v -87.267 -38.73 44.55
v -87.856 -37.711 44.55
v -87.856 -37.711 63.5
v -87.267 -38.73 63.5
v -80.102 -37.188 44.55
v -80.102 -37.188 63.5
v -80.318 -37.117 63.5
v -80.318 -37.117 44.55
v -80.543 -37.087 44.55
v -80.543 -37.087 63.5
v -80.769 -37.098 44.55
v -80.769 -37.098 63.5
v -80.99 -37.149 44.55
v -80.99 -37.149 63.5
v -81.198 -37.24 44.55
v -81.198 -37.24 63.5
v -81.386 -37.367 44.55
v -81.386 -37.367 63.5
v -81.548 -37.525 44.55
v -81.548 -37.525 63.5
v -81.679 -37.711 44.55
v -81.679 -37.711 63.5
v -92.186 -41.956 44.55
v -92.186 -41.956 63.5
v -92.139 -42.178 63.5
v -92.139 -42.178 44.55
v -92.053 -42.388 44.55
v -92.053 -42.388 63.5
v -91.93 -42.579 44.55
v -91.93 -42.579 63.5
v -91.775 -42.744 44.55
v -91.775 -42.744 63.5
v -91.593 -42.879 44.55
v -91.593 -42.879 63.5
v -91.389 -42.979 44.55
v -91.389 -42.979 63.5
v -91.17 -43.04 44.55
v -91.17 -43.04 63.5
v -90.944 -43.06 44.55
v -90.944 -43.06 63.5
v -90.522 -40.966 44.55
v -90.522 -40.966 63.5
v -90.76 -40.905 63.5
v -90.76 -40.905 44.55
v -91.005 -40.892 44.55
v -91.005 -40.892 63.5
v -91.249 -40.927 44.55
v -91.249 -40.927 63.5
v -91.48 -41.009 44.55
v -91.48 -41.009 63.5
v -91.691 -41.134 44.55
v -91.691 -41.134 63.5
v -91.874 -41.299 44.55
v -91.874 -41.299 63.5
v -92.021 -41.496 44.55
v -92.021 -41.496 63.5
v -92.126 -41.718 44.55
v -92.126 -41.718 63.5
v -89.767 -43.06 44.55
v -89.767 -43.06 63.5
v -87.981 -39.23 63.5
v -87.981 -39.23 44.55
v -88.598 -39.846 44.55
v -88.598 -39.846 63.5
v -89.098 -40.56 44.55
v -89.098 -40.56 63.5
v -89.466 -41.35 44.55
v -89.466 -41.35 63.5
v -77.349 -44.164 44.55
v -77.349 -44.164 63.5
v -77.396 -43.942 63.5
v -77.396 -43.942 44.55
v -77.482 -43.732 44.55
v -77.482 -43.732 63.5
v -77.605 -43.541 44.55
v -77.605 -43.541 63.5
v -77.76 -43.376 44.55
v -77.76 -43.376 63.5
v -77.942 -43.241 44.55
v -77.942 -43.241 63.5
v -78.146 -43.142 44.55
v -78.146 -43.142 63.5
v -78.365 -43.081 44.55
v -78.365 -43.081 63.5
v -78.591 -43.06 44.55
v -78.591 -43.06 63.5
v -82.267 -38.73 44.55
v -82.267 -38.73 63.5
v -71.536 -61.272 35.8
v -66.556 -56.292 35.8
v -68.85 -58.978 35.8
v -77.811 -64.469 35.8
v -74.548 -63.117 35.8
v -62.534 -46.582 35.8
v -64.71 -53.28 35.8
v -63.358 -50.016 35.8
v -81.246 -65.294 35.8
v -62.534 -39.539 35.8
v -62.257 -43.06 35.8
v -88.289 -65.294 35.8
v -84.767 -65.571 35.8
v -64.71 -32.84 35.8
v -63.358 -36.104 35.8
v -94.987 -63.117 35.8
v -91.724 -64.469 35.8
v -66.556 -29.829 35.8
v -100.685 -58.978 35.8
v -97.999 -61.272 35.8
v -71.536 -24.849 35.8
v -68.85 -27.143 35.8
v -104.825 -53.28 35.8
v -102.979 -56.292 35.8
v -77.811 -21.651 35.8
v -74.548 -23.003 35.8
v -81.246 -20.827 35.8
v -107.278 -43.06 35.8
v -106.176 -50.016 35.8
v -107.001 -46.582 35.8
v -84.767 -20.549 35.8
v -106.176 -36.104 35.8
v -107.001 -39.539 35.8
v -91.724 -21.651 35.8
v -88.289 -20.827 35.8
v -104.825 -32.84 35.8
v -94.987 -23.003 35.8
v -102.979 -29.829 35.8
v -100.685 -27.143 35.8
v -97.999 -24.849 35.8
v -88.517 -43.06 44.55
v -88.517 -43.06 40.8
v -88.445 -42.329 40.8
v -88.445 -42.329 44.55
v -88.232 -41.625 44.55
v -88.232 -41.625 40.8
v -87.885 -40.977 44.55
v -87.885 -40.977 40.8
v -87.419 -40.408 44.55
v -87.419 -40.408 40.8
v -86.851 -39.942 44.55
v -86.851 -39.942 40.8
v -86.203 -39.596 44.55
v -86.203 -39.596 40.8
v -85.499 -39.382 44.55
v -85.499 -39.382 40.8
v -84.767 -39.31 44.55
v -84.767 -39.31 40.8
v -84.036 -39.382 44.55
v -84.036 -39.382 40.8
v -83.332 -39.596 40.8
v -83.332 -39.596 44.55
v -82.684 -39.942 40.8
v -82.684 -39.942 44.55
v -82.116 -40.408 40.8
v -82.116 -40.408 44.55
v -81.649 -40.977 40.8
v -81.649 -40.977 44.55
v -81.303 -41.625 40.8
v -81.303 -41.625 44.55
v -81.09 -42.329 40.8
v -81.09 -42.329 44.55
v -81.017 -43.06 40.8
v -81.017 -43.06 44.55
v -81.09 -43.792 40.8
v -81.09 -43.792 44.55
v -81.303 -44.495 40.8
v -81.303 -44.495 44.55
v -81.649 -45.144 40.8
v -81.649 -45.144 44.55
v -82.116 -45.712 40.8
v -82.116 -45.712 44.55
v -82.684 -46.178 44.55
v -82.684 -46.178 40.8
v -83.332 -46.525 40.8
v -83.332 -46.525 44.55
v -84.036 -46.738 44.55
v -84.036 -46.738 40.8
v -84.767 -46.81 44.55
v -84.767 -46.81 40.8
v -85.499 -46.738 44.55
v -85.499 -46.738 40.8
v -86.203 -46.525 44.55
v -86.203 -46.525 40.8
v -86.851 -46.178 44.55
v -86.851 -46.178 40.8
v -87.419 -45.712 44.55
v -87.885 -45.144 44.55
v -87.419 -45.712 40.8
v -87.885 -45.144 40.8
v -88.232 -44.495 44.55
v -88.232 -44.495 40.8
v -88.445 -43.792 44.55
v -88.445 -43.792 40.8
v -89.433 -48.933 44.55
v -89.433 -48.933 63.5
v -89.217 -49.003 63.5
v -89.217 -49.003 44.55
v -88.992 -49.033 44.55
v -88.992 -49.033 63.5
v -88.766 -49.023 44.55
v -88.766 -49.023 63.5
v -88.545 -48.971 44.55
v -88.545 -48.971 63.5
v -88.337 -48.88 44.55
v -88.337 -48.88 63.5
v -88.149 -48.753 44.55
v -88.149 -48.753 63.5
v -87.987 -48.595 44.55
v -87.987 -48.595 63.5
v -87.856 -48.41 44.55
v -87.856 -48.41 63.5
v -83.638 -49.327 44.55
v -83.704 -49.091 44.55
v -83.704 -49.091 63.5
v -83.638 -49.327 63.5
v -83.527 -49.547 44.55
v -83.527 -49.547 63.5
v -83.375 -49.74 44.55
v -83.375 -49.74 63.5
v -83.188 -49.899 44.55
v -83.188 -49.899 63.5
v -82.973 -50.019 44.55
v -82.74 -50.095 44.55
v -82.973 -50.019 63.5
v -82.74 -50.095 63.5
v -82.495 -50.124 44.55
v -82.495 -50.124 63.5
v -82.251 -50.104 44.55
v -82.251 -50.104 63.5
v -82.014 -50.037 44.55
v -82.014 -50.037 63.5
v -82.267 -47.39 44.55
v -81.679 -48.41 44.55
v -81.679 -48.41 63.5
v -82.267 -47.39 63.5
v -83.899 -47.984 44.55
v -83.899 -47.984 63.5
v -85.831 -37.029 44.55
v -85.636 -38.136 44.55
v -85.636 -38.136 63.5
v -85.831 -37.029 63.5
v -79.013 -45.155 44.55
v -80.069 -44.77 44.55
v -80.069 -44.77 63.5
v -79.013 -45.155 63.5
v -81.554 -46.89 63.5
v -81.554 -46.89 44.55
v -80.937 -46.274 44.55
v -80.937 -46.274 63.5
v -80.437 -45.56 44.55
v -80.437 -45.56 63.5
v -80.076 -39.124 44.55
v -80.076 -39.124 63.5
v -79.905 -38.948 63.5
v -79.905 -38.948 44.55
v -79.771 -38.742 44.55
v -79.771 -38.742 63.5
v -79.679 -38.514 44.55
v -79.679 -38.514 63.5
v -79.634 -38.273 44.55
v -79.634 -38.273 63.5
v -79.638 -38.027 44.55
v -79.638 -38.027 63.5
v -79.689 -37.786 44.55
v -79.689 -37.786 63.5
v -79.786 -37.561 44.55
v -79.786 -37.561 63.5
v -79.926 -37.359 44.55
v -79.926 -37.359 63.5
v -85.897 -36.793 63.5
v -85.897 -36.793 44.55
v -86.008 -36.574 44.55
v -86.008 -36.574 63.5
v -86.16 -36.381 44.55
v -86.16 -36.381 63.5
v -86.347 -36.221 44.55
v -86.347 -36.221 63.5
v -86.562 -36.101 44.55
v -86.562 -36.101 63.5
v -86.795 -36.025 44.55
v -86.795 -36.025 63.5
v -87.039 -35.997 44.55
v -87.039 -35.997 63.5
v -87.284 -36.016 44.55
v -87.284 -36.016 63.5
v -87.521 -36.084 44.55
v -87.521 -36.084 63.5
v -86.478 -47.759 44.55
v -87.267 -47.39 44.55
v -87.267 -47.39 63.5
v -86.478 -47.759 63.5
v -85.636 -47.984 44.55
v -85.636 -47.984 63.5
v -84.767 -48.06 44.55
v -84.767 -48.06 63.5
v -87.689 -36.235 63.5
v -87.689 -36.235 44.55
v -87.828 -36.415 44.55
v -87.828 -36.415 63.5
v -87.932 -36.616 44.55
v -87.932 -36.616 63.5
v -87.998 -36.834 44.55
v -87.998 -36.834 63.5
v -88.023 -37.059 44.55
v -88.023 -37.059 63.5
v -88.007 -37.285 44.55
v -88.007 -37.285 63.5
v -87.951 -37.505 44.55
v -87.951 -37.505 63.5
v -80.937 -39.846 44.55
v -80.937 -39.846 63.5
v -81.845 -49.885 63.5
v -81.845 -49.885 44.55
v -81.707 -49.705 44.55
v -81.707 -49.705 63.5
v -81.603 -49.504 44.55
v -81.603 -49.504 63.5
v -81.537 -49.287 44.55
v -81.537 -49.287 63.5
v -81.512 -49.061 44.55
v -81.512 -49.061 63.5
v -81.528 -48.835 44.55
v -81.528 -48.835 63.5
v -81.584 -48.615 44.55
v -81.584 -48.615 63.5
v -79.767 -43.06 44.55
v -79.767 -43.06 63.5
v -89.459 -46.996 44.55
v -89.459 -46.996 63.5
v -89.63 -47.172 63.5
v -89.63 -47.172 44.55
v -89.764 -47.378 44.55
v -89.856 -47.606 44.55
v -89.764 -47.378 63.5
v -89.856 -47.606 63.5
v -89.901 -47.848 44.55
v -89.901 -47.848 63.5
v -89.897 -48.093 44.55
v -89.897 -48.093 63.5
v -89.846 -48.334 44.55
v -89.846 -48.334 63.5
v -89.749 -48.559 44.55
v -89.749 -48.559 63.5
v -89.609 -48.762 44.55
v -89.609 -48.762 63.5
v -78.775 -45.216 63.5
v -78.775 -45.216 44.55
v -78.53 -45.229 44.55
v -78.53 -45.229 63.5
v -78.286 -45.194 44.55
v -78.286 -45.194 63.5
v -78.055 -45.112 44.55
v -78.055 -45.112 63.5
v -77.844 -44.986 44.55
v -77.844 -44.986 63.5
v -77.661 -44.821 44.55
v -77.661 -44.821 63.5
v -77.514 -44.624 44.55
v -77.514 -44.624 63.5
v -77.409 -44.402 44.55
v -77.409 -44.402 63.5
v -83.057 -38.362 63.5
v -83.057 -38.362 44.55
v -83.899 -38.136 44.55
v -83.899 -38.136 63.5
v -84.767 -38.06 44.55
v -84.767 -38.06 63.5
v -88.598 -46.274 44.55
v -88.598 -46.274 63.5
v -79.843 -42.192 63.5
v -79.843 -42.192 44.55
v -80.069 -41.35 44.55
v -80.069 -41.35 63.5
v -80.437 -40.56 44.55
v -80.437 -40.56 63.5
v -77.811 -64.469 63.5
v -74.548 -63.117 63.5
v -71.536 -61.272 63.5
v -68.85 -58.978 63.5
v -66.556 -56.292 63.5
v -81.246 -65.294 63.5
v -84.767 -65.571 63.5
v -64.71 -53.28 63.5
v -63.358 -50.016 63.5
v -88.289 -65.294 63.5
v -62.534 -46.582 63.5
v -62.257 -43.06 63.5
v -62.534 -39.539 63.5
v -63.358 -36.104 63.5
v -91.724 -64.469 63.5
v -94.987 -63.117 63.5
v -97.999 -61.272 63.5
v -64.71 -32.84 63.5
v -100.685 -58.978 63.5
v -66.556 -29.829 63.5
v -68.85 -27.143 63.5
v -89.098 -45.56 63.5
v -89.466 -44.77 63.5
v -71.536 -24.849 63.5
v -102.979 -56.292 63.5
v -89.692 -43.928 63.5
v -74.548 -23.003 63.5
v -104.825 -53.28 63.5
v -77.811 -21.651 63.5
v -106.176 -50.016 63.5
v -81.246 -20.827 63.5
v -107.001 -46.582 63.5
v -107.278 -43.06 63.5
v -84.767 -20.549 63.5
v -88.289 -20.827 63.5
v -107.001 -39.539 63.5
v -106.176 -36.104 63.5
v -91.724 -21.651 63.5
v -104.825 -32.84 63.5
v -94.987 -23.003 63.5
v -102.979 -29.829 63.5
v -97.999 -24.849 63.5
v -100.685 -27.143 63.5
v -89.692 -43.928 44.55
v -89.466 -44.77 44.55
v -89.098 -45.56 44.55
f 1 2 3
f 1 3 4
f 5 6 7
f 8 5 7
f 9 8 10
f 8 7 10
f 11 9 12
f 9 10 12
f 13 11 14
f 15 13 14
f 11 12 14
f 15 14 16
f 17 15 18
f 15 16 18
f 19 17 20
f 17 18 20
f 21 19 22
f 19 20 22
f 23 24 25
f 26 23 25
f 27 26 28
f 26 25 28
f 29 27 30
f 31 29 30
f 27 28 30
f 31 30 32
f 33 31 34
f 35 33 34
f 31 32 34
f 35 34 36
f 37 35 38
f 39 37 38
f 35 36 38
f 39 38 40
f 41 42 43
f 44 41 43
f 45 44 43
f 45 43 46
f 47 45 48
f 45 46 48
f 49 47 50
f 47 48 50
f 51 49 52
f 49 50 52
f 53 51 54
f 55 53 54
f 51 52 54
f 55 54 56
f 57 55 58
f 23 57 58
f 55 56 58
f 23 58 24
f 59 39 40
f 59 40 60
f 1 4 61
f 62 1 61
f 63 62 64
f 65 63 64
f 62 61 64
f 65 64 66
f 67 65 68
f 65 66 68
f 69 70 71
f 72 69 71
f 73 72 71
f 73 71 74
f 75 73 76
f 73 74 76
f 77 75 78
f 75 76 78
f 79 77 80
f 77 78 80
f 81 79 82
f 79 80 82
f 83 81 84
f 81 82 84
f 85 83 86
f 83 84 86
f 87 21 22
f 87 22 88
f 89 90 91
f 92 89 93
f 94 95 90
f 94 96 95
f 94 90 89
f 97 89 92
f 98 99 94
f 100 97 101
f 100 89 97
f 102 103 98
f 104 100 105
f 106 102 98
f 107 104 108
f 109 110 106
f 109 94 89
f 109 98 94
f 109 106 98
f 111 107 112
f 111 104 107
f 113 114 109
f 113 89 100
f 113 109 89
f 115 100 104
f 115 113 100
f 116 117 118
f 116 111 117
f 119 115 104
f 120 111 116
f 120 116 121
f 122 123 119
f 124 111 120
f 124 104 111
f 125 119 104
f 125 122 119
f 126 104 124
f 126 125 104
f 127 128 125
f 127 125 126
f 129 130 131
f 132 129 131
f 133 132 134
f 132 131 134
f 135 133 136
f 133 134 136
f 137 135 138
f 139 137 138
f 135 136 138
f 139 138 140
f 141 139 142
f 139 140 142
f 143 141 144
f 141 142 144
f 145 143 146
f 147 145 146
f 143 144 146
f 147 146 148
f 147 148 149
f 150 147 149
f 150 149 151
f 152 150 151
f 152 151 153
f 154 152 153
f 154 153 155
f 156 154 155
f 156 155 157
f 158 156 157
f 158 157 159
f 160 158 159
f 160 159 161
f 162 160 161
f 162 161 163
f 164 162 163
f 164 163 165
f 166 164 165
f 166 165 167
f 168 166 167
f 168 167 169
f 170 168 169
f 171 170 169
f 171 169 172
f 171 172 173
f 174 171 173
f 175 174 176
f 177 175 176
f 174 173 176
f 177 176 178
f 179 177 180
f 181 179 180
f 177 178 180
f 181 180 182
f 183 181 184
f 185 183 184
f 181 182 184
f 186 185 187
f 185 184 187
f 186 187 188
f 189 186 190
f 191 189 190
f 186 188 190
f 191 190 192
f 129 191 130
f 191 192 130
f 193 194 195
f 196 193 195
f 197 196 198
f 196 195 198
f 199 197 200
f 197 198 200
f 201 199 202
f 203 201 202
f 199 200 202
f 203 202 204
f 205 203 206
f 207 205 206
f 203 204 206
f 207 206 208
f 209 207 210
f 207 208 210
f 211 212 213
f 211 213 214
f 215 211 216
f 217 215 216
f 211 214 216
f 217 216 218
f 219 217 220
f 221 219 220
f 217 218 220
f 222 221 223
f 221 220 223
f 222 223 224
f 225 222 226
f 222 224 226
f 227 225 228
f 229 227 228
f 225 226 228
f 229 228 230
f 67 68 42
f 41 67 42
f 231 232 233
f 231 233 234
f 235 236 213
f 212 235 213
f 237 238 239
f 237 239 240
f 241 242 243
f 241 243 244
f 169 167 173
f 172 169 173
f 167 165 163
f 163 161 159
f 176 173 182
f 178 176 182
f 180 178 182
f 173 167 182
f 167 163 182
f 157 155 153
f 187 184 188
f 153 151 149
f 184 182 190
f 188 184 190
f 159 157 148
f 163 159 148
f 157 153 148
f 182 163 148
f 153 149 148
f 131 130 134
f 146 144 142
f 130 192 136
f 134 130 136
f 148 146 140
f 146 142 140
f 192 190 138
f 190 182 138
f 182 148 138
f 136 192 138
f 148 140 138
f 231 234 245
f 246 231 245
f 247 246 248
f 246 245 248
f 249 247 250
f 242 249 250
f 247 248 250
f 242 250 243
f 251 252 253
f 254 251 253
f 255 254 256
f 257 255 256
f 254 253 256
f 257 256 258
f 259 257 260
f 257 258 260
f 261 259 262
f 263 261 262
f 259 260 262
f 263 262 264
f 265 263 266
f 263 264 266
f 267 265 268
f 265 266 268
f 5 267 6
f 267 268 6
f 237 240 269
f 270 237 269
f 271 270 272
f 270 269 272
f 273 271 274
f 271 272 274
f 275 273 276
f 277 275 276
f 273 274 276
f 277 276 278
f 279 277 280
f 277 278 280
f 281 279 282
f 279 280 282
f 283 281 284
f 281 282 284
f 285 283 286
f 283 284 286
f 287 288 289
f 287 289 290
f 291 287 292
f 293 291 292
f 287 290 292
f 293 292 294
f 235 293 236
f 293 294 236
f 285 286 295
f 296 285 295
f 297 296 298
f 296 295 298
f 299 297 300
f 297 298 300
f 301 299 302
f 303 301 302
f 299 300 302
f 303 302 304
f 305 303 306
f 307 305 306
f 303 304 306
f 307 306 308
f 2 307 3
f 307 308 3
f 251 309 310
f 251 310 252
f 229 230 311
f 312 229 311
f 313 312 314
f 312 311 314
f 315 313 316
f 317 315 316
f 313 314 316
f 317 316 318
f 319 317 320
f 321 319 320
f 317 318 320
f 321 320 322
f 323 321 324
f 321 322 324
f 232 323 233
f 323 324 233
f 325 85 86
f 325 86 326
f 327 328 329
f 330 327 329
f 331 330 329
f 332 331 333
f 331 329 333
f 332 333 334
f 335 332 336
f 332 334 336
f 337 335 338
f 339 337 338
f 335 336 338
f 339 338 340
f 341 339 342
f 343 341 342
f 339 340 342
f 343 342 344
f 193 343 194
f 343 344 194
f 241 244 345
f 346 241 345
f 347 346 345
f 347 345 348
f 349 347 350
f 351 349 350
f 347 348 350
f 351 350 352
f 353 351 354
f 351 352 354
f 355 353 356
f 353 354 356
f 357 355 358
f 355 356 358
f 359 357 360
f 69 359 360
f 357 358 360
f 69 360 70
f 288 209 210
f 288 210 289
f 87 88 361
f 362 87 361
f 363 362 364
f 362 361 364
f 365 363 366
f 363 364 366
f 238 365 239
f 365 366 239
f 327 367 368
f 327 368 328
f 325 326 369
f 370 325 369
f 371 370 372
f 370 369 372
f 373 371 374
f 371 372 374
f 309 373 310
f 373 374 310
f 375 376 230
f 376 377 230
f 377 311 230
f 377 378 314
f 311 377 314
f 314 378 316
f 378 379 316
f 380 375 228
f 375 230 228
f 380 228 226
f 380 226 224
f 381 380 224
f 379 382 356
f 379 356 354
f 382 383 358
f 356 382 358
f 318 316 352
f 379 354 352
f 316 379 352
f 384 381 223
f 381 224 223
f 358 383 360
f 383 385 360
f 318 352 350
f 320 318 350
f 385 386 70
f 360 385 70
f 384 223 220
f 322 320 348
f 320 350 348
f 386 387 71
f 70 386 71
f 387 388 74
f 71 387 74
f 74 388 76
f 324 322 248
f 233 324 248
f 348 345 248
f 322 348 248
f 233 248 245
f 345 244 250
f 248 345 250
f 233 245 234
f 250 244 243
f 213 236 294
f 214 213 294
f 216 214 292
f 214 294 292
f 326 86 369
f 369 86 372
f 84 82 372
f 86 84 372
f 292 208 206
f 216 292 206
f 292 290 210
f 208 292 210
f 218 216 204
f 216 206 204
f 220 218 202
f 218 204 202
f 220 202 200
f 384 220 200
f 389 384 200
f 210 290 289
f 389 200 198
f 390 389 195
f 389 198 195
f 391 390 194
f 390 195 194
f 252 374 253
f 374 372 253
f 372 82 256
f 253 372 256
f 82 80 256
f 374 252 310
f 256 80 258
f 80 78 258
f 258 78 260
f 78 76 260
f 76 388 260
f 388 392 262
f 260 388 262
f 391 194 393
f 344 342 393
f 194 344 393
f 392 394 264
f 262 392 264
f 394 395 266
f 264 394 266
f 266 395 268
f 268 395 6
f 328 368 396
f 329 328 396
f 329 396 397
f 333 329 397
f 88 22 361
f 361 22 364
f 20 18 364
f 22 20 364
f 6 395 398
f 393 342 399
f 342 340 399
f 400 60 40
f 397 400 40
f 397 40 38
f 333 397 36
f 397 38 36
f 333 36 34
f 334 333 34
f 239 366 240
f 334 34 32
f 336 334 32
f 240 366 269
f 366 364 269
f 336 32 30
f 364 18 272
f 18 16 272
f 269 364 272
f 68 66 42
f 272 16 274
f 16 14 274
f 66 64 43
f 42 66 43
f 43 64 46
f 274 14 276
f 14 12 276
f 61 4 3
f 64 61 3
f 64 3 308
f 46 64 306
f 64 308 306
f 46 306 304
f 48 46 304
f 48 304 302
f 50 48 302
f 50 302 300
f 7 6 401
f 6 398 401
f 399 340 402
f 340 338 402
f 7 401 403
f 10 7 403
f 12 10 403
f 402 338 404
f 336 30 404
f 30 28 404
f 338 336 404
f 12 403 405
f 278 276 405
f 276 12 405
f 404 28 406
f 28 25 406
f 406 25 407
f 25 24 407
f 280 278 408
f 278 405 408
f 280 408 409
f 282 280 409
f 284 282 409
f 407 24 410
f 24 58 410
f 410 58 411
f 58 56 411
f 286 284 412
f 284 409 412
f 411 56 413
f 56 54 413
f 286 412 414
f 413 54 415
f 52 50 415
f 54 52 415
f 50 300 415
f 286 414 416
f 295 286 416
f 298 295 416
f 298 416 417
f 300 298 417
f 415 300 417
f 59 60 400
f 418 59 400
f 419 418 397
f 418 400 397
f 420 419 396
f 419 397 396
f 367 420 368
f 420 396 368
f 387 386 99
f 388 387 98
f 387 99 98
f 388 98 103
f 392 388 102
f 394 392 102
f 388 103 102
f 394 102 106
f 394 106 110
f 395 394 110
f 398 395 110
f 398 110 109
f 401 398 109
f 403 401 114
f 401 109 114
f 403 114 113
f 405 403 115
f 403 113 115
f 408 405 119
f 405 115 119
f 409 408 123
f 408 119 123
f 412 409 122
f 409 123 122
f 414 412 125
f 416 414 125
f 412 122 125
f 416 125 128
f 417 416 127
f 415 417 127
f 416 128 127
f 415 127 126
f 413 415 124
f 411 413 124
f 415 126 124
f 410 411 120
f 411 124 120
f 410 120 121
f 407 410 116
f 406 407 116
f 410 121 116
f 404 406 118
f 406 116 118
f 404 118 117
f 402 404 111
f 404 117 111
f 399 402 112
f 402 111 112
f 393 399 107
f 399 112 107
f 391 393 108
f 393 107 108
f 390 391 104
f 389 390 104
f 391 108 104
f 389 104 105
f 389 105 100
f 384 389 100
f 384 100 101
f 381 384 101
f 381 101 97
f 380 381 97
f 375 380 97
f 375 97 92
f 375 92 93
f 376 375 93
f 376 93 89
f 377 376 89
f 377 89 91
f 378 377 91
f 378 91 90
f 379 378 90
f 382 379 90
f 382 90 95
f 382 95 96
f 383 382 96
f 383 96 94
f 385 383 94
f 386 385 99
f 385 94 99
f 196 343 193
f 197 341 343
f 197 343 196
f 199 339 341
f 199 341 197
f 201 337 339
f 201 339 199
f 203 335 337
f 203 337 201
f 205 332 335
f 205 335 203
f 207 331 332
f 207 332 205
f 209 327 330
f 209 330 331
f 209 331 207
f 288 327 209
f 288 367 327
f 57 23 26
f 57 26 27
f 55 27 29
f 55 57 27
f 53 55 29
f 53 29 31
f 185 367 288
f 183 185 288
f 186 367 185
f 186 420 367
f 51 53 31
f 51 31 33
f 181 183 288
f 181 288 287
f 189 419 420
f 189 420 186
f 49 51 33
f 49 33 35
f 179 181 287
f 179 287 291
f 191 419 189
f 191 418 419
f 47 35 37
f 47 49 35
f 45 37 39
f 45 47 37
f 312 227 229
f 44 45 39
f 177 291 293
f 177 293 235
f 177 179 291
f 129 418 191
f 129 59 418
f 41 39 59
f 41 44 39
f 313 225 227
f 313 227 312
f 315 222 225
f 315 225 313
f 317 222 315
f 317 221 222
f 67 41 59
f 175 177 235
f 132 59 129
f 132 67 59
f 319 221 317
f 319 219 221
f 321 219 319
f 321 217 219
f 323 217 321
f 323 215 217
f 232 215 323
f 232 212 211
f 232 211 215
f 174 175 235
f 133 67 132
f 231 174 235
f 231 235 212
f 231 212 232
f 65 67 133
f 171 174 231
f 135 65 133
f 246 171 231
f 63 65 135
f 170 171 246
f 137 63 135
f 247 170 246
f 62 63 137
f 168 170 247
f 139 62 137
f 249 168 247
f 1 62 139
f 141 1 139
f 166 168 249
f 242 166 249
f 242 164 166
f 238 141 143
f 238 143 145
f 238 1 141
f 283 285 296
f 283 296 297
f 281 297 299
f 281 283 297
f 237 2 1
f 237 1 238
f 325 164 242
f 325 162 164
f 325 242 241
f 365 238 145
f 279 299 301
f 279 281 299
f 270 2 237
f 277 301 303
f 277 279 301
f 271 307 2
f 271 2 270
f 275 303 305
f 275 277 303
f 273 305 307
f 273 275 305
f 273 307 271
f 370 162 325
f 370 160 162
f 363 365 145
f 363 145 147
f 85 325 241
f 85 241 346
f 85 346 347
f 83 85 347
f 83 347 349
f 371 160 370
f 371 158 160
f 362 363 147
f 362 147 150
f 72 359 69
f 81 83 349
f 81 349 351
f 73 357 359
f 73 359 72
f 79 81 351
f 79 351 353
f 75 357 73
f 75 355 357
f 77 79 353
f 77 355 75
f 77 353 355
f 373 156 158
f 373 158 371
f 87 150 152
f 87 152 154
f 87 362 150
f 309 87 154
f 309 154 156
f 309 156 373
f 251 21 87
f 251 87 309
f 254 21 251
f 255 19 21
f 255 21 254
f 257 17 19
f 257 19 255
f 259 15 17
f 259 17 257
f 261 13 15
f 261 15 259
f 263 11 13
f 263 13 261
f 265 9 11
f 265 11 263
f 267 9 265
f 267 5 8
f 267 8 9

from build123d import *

# Parameters (mm, degrees)
SKETCH1_W                      = 22.51077
SKETCH1_H                      = 27.7
CUT_EXTRUDE1_DEPTH             = 18.95
F_7_5_7_5_DIAMETER_HOLE1_D     = 7.5
F_7_5_7_5_DIAMETER_HOLE1_DEPTH = 3.75


with BuildPart() as part:
    # Sketch1 → Revolve1 (revolve)
    with BuildSketch(Plane(origin=(0, -43.060148556, 0), x_dir=(1, 0, 0), z_dir=(0, 1, 0))):
        with Locations((-73.512097724, -49.65)):
            Rectangle(SKETCH1_W, SKETCH1_H)
    revolve(axis=Axis((-84.767482724, -43.060148556, 35.8), (0, 0, 1)))

    # Sketch2 → Cut-Extrude1 (cut)
    with BuildSketch(Plane.XY.offset(63.5)):
        with BuildLine():
            Line((-85.635723612, -38.136109791), (-85.830856299, -37.029457332))
            ThreePointArc((-85.830856299, -37.029457332), (-86.451441226, -36.155700609), (-87.520742643, -36.083791354))
            ThreePointArc((-87.520742643, -36.083791354), (-87.997695155, -36.833554149), (-87.855939444, -37.7107846))
            Line((-87.855939444, -37.7107846), (-87.267482724, -38.730021537))
            ThreePointArc((-87.267482724, -38.730021537), (-88.597704939, -39.846210508), (-89.465945828, -41.350047839))
            Line((-89.465945828, -41.350047839), (-90.521901314, -40.965711474))
            ThreePointArc((-90.521901314, -40.965711474), (-91.588889296, -41.066275425), (-92.185815247, -41.956362989))
            ThreePointArc((-92.185815247, -41.956362989), (-91.774977875, -42.744297377), (-90.944396164, -43.060148556))
            Line((-90.944396164, -43.060148556), (-89.767482724, -43.060148556))
            ThreePointArc((-89.767482724, -43.060148556), (-89.465945828, -44.770249273), (-88.597704939, -46.274086605))
            Line((-88.597704939, -46.274086605), (-89.458527739, -46.996402698))
            ThreePointArc((-89.458527739, -46.996402698), (-89.904930794, -47.970723371), (-89.432555327, -48.932720191))
            ThreePointArc((-89.432555327, -48.932720191), (-88.544765444, -48.970891785), (-87.855939444, -48.409512512))
            Line((-87.855939444, -48.409512512), (-87.267482724, -47.390275575))
            ThreePointArc((-87.267482724, -47.390275575), (-85.635723612, -47.984187321), (-83.899241835, -47.984187321))
            Line((-83.899241835, -47.984187321), (-83.704109149, -49.09083978))
            ThreePointArc((-83.704109149, -49.09083978), (-83.083524222, -49.964596503), (-82.014222804, -50.036505758))
            ThreePointArc((-82.014222804, -50.036505758), (-81.537270293, -49.286742964), (-81.679026004, -48.409512512))
            Line((-81.679026004, -48.409512512), (-82.267482724, -47.390275575))
            ThreePointArc((-82.267482724, -47.390275575), (-80.937260508, -46.274086605), (-80.06901962, -44.770249273))
            Line((-80.06901962, -44.770249273), (-79.013064134, -45.154585638))
            ThreePointArc((-79.013064134, -45.154585638), (-77.946076152, -45.054021688), (-77.349150201, -44.163934124))
            ThreePointArc((-77.349150201, -44.163934124), (-77.759987572, -43.375999735), (-78.590569284, -43.060148556))
            Line((-78.590569284, -43.060148556), (-79.767482724, -43.060148556))
            ThreePointArc((-79.767482724, -43.060148556), (-80.06901962, -41.350047839), (-80.937260508, -39.846210508))
            Line((-80.937260508, -39.846210508), (-80.076437709, -39.123894414))
            ThreePointArc((-80.076437709, -39.123894414), (-79.630034654, -38.149573741), (-80.10241012, -37.187576921))
            ThreePointArc((-80.10241012, -37.187576921), (-80.990200003, -37.149405327), (-81.679026004, -37.7107846))
            Line((-81.679026004, -37.7107846), (-82.267482724, -38.730021537))
            ThreePointArc((-82.267482724, -38.730021537), (-83.899241835, -38.136109791), (-85.635723612, -38.136109791))
        make_face()
    extrude(amount=-CUT_EXTRUDE1_DEPTH, mode=Mode.SUBTRACT)

    # Ø7.5 (7.5) Diameter Hole1
    with Locations(Plane.XY.offset(44.55)):
        with Locations((-84.767482724, -43.060148556)):
            Hole(F_7_5_7_5_DIAMETER_HOLE1_D / 2, depth=F_7_5_7_5_DIAMETER_HOLE1_DEPTH)


solid = part.part
